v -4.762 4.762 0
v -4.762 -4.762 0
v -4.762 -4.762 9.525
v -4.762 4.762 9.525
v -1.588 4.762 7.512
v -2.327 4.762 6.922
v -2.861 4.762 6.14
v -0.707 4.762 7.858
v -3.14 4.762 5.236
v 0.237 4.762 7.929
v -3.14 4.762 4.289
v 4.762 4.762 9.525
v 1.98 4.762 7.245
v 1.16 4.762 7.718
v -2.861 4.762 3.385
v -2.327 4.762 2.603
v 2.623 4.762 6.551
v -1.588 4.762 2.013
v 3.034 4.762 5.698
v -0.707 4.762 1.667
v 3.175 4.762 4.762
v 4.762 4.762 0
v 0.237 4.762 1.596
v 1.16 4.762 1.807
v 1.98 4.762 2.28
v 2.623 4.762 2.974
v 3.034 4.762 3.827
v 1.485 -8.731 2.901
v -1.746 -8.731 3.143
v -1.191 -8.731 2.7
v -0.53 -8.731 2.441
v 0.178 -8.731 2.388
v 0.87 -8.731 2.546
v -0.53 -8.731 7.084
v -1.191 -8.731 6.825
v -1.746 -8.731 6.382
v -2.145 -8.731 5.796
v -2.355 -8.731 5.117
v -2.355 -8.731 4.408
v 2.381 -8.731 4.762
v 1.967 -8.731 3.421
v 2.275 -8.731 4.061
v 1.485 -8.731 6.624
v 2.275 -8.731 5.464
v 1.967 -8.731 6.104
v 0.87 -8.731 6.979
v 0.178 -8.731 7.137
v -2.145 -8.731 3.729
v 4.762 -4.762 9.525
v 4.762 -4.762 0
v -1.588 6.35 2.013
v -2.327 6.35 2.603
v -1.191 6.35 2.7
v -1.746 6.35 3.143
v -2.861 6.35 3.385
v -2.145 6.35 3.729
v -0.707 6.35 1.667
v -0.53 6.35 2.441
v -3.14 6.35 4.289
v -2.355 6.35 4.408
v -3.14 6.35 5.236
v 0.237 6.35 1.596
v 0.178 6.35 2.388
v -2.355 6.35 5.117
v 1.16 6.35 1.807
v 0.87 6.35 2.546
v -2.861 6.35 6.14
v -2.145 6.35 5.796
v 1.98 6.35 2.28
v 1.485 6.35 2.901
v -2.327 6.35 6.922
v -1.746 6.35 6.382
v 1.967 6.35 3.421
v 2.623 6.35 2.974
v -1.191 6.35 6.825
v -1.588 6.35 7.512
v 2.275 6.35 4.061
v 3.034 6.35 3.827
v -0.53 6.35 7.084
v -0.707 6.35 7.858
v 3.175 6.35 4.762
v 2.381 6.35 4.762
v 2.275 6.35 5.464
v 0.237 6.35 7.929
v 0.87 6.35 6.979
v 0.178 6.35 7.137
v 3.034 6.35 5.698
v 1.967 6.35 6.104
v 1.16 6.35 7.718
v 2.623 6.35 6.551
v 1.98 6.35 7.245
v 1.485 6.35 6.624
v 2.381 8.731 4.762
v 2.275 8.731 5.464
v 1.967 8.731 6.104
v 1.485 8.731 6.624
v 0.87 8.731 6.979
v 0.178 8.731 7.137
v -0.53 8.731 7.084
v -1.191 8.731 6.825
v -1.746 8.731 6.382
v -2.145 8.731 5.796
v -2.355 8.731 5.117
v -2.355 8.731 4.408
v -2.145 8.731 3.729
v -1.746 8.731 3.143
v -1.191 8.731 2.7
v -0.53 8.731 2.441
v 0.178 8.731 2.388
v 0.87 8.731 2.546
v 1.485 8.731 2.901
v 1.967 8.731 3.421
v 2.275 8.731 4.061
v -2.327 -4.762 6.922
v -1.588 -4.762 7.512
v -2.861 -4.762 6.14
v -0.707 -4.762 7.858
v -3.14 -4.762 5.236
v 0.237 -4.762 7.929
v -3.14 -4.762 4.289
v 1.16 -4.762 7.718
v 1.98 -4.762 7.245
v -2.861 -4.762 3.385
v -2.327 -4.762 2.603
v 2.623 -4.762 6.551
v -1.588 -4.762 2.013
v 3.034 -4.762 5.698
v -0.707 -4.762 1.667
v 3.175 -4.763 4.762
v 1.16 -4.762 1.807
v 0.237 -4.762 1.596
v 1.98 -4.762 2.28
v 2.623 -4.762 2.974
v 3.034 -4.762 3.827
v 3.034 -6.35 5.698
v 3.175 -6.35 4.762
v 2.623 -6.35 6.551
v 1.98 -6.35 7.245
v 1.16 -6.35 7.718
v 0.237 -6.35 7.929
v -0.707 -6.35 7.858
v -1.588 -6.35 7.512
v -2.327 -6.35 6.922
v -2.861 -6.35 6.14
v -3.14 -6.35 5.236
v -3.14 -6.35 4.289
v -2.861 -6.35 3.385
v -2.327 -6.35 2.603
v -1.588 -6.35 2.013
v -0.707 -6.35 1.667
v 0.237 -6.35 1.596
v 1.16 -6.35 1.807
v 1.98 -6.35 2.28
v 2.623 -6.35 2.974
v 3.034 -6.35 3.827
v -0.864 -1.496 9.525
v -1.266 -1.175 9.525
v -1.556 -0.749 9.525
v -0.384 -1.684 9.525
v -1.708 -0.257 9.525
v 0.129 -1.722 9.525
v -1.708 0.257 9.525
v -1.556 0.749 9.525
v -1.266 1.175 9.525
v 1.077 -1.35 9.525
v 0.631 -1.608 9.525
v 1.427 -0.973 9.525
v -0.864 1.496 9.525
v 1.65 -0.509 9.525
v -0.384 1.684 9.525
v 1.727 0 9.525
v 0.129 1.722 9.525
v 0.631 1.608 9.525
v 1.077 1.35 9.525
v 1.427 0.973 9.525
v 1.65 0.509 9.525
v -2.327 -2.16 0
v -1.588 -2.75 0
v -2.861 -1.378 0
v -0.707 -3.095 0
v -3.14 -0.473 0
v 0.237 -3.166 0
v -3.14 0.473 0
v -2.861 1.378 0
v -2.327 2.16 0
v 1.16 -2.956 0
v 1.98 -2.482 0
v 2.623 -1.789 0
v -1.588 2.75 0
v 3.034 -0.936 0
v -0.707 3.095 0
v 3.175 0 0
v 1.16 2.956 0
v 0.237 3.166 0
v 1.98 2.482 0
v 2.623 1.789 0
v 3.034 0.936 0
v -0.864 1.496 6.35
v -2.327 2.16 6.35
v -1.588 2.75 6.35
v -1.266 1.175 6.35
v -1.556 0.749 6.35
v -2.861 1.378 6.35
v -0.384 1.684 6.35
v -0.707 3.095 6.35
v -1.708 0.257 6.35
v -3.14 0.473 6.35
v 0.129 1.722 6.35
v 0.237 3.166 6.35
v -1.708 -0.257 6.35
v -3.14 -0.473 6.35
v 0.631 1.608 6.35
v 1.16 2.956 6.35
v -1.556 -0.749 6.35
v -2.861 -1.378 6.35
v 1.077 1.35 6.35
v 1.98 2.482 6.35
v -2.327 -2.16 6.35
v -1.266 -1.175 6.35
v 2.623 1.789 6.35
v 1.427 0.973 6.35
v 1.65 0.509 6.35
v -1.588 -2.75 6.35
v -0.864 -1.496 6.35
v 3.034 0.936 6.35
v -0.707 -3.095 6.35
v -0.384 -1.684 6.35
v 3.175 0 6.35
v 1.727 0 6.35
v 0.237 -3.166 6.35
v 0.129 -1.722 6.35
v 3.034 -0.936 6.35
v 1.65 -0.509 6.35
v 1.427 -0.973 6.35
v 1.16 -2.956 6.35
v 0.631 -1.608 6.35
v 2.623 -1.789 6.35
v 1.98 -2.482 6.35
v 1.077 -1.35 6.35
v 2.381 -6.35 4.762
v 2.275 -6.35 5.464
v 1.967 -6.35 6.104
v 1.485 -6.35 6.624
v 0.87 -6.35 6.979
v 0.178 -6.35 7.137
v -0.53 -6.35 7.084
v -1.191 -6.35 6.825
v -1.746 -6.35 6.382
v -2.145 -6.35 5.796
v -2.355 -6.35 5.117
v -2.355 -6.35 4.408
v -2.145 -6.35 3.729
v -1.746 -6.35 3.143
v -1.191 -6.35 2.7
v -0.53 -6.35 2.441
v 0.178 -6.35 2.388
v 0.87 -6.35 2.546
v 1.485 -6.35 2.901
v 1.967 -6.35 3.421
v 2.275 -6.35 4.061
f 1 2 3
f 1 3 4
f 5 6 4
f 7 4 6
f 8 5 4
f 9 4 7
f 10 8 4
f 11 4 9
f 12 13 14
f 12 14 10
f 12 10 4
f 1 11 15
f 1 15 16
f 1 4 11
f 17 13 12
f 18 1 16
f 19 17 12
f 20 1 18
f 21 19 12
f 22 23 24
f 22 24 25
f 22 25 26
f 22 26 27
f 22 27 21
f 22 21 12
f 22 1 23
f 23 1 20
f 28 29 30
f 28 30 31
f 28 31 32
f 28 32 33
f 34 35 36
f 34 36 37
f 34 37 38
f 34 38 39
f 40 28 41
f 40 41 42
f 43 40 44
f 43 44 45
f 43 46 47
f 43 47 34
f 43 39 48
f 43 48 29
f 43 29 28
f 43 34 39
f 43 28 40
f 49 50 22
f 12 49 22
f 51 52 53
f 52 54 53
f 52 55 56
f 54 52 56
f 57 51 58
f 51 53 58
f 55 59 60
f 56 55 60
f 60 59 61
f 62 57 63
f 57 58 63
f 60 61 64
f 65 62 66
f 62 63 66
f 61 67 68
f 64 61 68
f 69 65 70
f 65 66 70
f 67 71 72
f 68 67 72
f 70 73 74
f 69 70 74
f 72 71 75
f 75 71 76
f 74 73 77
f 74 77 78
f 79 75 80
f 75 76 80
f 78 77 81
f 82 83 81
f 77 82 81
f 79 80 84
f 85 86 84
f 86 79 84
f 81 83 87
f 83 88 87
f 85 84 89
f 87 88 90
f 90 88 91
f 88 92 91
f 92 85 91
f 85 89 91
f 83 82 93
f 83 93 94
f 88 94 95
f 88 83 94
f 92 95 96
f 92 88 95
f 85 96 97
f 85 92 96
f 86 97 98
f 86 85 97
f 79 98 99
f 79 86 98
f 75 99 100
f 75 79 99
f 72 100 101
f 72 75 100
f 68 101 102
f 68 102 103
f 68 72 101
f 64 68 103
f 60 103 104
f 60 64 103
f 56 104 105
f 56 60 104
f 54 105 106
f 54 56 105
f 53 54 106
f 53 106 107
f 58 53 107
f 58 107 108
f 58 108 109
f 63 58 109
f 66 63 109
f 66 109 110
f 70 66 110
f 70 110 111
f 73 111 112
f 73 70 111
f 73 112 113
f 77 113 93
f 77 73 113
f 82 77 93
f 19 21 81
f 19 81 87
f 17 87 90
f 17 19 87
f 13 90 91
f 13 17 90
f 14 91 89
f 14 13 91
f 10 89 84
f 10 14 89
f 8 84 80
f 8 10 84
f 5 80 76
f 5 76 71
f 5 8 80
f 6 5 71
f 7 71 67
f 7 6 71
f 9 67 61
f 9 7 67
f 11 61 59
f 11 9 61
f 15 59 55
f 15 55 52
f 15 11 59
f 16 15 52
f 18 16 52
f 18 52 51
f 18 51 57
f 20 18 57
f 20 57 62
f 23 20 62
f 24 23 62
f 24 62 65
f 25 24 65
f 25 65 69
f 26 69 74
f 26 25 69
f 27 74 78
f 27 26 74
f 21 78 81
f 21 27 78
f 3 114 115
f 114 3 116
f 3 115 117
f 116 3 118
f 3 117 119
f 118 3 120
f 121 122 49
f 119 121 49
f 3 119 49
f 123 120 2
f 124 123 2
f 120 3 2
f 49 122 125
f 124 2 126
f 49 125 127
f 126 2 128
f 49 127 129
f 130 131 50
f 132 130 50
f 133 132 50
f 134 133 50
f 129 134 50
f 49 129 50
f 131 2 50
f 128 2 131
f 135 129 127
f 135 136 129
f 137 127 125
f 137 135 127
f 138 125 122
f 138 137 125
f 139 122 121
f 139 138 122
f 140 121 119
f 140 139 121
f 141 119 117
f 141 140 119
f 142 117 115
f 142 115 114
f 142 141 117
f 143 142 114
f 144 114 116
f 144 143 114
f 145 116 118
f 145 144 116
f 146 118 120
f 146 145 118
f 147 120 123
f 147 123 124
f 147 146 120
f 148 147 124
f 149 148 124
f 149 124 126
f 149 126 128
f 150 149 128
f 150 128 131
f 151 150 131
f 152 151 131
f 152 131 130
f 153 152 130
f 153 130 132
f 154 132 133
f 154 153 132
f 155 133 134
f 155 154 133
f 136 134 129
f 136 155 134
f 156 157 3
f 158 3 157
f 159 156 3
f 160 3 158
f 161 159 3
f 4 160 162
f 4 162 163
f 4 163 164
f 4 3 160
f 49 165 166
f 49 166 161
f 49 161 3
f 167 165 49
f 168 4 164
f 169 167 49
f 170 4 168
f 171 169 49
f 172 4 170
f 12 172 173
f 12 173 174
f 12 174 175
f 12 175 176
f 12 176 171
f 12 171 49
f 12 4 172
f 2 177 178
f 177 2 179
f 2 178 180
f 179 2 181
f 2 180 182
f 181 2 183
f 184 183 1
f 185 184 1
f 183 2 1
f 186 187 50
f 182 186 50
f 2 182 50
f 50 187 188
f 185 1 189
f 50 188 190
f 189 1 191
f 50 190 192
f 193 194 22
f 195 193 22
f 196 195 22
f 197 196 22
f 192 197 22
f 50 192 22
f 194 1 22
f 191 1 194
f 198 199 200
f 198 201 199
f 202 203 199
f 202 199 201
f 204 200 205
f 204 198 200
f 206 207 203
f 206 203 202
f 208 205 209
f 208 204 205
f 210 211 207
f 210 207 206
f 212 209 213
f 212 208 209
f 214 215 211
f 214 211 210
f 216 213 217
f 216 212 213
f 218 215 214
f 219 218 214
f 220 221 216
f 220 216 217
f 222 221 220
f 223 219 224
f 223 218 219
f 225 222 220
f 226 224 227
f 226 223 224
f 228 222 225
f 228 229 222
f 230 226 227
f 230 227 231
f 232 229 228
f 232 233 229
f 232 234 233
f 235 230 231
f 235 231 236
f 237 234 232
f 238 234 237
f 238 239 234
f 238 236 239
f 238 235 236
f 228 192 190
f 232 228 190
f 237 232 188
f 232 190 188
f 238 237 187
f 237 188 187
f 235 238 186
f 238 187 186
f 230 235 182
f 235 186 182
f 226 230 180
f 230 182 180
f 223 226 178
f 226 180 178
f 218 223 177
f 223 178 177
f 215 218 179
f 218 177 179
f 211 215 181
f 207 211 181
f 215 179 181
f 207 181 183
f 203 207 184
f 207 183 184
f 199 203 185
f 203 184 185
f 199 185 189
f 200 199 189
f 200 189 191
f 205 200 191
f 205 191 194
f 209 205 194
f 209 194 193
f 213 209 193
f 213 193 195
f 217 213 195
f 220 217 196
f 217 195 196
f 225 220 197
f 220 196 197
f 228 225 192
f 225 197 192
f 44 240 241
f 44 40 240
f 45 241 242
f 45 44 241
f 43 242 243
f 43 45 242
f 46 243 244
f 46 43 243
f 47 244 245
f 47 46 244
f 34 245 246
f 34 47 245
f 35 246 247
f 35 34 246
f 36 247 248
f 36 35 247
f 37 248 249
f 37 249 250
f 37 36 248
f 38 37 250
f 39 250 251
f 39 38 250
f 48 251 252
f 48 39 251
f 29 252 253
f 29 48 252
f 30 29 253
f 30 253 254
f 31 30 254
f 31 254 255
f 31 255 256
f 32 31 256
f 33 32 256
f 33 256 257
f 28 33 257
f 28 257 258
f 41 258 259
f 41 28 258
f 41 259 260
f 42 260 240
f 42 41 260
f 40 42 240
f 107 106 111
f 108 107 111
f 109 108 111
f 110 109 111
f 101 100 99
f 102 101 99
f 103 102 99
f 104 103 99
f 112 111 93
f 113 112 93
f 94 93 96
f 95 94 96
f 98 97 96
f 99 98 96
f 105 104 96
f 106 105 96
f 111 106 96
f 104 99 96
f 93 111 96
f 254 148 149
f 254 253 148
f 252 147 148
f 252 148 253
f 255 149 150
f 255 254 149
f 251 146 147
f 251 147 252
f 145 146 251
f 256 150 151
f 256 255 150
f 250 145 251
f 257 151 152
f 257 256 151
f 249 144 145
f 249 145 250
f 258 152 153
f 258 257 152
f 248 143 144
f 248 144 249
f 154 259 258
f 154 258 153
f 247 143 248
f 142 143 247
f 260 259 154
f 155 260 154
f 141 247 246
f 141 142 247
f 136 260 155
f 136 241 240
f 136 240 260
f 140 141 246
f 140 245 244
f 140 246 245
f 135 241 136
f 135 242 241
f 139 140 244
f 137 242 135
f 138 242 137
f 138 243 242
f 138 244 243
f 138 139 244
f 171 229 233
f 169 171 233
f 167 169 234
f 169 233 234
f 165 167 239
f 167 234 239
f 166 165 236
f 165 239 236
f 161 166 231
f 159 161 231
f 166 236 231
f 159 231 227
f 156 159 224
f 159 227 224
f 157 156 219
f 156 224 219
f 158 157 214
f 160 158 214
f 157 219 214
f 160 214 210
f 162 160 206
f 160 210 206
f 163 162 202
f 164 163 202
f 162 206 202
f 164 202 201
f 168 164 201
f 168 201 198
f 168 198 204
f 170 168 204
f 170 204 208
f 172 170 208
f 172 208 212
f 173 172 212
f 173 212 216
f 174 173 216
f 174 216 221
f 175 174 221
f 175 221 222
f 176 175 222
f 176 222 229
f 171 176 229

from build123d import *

# Parameters (mm, degrees)
F0_W     = 9.525
F0_H     = 9.525
F1_DEPTH = 9.525
F2_R     = 3.175
F3_DEPTH = 6.35
F4_R     = 2.38125
F5_DEPTH = 8.73125
F6_R     = 1.7272
F7_DEPTH = 9.525
F8_R     = 3.175
F9_DEPTH = 6.35


with BuildPart() as f1:
    # F0 (on Top) → F1 (new body)
    with BuildSketch(Plane.XY):
        Rectangle(F0_W, F0_H)
    extrude(amount=F1_DEPTH)

    # F2 (on Front) → F3 (join, symmetric)
    with BuildSketch(Plane.XZ):
        with Locations((0, 4.7625)):
            Circle(F2_R)
    extrude(amount=F3_DEPTH, both=True)

    # F4 (on Front) → F5 (join, symmetric)
    with BuildSketch(Plane.XZ):
        with Locations((0, 4.7625)):
            Circle(F4_R)
    extrude(amount=F5_DEPTH, both=True)

    # F6 (on face) → F7 (cut, through all)
    with BuildSketch(Plane(origin=(0, 0, 0), x_dir=(1, 0, 0), z_dir=(0, 0, -1))):
        Circle(F6_R)
    extrude(amount=-F7_DEPTH, mode=Mode.SUBTRACT)

    # F8 (on face) → F9 (cut)
    with BuildSketch(Plane(origin=(0, 0, 0), x_dir=(1, 0, 0), z_dir=(0, 0, -1))):
        Circle(F8_R)
    extrude(amount=-F9_DEPTH, mode=Mode.SUBTRACT)


solid = f1.part
